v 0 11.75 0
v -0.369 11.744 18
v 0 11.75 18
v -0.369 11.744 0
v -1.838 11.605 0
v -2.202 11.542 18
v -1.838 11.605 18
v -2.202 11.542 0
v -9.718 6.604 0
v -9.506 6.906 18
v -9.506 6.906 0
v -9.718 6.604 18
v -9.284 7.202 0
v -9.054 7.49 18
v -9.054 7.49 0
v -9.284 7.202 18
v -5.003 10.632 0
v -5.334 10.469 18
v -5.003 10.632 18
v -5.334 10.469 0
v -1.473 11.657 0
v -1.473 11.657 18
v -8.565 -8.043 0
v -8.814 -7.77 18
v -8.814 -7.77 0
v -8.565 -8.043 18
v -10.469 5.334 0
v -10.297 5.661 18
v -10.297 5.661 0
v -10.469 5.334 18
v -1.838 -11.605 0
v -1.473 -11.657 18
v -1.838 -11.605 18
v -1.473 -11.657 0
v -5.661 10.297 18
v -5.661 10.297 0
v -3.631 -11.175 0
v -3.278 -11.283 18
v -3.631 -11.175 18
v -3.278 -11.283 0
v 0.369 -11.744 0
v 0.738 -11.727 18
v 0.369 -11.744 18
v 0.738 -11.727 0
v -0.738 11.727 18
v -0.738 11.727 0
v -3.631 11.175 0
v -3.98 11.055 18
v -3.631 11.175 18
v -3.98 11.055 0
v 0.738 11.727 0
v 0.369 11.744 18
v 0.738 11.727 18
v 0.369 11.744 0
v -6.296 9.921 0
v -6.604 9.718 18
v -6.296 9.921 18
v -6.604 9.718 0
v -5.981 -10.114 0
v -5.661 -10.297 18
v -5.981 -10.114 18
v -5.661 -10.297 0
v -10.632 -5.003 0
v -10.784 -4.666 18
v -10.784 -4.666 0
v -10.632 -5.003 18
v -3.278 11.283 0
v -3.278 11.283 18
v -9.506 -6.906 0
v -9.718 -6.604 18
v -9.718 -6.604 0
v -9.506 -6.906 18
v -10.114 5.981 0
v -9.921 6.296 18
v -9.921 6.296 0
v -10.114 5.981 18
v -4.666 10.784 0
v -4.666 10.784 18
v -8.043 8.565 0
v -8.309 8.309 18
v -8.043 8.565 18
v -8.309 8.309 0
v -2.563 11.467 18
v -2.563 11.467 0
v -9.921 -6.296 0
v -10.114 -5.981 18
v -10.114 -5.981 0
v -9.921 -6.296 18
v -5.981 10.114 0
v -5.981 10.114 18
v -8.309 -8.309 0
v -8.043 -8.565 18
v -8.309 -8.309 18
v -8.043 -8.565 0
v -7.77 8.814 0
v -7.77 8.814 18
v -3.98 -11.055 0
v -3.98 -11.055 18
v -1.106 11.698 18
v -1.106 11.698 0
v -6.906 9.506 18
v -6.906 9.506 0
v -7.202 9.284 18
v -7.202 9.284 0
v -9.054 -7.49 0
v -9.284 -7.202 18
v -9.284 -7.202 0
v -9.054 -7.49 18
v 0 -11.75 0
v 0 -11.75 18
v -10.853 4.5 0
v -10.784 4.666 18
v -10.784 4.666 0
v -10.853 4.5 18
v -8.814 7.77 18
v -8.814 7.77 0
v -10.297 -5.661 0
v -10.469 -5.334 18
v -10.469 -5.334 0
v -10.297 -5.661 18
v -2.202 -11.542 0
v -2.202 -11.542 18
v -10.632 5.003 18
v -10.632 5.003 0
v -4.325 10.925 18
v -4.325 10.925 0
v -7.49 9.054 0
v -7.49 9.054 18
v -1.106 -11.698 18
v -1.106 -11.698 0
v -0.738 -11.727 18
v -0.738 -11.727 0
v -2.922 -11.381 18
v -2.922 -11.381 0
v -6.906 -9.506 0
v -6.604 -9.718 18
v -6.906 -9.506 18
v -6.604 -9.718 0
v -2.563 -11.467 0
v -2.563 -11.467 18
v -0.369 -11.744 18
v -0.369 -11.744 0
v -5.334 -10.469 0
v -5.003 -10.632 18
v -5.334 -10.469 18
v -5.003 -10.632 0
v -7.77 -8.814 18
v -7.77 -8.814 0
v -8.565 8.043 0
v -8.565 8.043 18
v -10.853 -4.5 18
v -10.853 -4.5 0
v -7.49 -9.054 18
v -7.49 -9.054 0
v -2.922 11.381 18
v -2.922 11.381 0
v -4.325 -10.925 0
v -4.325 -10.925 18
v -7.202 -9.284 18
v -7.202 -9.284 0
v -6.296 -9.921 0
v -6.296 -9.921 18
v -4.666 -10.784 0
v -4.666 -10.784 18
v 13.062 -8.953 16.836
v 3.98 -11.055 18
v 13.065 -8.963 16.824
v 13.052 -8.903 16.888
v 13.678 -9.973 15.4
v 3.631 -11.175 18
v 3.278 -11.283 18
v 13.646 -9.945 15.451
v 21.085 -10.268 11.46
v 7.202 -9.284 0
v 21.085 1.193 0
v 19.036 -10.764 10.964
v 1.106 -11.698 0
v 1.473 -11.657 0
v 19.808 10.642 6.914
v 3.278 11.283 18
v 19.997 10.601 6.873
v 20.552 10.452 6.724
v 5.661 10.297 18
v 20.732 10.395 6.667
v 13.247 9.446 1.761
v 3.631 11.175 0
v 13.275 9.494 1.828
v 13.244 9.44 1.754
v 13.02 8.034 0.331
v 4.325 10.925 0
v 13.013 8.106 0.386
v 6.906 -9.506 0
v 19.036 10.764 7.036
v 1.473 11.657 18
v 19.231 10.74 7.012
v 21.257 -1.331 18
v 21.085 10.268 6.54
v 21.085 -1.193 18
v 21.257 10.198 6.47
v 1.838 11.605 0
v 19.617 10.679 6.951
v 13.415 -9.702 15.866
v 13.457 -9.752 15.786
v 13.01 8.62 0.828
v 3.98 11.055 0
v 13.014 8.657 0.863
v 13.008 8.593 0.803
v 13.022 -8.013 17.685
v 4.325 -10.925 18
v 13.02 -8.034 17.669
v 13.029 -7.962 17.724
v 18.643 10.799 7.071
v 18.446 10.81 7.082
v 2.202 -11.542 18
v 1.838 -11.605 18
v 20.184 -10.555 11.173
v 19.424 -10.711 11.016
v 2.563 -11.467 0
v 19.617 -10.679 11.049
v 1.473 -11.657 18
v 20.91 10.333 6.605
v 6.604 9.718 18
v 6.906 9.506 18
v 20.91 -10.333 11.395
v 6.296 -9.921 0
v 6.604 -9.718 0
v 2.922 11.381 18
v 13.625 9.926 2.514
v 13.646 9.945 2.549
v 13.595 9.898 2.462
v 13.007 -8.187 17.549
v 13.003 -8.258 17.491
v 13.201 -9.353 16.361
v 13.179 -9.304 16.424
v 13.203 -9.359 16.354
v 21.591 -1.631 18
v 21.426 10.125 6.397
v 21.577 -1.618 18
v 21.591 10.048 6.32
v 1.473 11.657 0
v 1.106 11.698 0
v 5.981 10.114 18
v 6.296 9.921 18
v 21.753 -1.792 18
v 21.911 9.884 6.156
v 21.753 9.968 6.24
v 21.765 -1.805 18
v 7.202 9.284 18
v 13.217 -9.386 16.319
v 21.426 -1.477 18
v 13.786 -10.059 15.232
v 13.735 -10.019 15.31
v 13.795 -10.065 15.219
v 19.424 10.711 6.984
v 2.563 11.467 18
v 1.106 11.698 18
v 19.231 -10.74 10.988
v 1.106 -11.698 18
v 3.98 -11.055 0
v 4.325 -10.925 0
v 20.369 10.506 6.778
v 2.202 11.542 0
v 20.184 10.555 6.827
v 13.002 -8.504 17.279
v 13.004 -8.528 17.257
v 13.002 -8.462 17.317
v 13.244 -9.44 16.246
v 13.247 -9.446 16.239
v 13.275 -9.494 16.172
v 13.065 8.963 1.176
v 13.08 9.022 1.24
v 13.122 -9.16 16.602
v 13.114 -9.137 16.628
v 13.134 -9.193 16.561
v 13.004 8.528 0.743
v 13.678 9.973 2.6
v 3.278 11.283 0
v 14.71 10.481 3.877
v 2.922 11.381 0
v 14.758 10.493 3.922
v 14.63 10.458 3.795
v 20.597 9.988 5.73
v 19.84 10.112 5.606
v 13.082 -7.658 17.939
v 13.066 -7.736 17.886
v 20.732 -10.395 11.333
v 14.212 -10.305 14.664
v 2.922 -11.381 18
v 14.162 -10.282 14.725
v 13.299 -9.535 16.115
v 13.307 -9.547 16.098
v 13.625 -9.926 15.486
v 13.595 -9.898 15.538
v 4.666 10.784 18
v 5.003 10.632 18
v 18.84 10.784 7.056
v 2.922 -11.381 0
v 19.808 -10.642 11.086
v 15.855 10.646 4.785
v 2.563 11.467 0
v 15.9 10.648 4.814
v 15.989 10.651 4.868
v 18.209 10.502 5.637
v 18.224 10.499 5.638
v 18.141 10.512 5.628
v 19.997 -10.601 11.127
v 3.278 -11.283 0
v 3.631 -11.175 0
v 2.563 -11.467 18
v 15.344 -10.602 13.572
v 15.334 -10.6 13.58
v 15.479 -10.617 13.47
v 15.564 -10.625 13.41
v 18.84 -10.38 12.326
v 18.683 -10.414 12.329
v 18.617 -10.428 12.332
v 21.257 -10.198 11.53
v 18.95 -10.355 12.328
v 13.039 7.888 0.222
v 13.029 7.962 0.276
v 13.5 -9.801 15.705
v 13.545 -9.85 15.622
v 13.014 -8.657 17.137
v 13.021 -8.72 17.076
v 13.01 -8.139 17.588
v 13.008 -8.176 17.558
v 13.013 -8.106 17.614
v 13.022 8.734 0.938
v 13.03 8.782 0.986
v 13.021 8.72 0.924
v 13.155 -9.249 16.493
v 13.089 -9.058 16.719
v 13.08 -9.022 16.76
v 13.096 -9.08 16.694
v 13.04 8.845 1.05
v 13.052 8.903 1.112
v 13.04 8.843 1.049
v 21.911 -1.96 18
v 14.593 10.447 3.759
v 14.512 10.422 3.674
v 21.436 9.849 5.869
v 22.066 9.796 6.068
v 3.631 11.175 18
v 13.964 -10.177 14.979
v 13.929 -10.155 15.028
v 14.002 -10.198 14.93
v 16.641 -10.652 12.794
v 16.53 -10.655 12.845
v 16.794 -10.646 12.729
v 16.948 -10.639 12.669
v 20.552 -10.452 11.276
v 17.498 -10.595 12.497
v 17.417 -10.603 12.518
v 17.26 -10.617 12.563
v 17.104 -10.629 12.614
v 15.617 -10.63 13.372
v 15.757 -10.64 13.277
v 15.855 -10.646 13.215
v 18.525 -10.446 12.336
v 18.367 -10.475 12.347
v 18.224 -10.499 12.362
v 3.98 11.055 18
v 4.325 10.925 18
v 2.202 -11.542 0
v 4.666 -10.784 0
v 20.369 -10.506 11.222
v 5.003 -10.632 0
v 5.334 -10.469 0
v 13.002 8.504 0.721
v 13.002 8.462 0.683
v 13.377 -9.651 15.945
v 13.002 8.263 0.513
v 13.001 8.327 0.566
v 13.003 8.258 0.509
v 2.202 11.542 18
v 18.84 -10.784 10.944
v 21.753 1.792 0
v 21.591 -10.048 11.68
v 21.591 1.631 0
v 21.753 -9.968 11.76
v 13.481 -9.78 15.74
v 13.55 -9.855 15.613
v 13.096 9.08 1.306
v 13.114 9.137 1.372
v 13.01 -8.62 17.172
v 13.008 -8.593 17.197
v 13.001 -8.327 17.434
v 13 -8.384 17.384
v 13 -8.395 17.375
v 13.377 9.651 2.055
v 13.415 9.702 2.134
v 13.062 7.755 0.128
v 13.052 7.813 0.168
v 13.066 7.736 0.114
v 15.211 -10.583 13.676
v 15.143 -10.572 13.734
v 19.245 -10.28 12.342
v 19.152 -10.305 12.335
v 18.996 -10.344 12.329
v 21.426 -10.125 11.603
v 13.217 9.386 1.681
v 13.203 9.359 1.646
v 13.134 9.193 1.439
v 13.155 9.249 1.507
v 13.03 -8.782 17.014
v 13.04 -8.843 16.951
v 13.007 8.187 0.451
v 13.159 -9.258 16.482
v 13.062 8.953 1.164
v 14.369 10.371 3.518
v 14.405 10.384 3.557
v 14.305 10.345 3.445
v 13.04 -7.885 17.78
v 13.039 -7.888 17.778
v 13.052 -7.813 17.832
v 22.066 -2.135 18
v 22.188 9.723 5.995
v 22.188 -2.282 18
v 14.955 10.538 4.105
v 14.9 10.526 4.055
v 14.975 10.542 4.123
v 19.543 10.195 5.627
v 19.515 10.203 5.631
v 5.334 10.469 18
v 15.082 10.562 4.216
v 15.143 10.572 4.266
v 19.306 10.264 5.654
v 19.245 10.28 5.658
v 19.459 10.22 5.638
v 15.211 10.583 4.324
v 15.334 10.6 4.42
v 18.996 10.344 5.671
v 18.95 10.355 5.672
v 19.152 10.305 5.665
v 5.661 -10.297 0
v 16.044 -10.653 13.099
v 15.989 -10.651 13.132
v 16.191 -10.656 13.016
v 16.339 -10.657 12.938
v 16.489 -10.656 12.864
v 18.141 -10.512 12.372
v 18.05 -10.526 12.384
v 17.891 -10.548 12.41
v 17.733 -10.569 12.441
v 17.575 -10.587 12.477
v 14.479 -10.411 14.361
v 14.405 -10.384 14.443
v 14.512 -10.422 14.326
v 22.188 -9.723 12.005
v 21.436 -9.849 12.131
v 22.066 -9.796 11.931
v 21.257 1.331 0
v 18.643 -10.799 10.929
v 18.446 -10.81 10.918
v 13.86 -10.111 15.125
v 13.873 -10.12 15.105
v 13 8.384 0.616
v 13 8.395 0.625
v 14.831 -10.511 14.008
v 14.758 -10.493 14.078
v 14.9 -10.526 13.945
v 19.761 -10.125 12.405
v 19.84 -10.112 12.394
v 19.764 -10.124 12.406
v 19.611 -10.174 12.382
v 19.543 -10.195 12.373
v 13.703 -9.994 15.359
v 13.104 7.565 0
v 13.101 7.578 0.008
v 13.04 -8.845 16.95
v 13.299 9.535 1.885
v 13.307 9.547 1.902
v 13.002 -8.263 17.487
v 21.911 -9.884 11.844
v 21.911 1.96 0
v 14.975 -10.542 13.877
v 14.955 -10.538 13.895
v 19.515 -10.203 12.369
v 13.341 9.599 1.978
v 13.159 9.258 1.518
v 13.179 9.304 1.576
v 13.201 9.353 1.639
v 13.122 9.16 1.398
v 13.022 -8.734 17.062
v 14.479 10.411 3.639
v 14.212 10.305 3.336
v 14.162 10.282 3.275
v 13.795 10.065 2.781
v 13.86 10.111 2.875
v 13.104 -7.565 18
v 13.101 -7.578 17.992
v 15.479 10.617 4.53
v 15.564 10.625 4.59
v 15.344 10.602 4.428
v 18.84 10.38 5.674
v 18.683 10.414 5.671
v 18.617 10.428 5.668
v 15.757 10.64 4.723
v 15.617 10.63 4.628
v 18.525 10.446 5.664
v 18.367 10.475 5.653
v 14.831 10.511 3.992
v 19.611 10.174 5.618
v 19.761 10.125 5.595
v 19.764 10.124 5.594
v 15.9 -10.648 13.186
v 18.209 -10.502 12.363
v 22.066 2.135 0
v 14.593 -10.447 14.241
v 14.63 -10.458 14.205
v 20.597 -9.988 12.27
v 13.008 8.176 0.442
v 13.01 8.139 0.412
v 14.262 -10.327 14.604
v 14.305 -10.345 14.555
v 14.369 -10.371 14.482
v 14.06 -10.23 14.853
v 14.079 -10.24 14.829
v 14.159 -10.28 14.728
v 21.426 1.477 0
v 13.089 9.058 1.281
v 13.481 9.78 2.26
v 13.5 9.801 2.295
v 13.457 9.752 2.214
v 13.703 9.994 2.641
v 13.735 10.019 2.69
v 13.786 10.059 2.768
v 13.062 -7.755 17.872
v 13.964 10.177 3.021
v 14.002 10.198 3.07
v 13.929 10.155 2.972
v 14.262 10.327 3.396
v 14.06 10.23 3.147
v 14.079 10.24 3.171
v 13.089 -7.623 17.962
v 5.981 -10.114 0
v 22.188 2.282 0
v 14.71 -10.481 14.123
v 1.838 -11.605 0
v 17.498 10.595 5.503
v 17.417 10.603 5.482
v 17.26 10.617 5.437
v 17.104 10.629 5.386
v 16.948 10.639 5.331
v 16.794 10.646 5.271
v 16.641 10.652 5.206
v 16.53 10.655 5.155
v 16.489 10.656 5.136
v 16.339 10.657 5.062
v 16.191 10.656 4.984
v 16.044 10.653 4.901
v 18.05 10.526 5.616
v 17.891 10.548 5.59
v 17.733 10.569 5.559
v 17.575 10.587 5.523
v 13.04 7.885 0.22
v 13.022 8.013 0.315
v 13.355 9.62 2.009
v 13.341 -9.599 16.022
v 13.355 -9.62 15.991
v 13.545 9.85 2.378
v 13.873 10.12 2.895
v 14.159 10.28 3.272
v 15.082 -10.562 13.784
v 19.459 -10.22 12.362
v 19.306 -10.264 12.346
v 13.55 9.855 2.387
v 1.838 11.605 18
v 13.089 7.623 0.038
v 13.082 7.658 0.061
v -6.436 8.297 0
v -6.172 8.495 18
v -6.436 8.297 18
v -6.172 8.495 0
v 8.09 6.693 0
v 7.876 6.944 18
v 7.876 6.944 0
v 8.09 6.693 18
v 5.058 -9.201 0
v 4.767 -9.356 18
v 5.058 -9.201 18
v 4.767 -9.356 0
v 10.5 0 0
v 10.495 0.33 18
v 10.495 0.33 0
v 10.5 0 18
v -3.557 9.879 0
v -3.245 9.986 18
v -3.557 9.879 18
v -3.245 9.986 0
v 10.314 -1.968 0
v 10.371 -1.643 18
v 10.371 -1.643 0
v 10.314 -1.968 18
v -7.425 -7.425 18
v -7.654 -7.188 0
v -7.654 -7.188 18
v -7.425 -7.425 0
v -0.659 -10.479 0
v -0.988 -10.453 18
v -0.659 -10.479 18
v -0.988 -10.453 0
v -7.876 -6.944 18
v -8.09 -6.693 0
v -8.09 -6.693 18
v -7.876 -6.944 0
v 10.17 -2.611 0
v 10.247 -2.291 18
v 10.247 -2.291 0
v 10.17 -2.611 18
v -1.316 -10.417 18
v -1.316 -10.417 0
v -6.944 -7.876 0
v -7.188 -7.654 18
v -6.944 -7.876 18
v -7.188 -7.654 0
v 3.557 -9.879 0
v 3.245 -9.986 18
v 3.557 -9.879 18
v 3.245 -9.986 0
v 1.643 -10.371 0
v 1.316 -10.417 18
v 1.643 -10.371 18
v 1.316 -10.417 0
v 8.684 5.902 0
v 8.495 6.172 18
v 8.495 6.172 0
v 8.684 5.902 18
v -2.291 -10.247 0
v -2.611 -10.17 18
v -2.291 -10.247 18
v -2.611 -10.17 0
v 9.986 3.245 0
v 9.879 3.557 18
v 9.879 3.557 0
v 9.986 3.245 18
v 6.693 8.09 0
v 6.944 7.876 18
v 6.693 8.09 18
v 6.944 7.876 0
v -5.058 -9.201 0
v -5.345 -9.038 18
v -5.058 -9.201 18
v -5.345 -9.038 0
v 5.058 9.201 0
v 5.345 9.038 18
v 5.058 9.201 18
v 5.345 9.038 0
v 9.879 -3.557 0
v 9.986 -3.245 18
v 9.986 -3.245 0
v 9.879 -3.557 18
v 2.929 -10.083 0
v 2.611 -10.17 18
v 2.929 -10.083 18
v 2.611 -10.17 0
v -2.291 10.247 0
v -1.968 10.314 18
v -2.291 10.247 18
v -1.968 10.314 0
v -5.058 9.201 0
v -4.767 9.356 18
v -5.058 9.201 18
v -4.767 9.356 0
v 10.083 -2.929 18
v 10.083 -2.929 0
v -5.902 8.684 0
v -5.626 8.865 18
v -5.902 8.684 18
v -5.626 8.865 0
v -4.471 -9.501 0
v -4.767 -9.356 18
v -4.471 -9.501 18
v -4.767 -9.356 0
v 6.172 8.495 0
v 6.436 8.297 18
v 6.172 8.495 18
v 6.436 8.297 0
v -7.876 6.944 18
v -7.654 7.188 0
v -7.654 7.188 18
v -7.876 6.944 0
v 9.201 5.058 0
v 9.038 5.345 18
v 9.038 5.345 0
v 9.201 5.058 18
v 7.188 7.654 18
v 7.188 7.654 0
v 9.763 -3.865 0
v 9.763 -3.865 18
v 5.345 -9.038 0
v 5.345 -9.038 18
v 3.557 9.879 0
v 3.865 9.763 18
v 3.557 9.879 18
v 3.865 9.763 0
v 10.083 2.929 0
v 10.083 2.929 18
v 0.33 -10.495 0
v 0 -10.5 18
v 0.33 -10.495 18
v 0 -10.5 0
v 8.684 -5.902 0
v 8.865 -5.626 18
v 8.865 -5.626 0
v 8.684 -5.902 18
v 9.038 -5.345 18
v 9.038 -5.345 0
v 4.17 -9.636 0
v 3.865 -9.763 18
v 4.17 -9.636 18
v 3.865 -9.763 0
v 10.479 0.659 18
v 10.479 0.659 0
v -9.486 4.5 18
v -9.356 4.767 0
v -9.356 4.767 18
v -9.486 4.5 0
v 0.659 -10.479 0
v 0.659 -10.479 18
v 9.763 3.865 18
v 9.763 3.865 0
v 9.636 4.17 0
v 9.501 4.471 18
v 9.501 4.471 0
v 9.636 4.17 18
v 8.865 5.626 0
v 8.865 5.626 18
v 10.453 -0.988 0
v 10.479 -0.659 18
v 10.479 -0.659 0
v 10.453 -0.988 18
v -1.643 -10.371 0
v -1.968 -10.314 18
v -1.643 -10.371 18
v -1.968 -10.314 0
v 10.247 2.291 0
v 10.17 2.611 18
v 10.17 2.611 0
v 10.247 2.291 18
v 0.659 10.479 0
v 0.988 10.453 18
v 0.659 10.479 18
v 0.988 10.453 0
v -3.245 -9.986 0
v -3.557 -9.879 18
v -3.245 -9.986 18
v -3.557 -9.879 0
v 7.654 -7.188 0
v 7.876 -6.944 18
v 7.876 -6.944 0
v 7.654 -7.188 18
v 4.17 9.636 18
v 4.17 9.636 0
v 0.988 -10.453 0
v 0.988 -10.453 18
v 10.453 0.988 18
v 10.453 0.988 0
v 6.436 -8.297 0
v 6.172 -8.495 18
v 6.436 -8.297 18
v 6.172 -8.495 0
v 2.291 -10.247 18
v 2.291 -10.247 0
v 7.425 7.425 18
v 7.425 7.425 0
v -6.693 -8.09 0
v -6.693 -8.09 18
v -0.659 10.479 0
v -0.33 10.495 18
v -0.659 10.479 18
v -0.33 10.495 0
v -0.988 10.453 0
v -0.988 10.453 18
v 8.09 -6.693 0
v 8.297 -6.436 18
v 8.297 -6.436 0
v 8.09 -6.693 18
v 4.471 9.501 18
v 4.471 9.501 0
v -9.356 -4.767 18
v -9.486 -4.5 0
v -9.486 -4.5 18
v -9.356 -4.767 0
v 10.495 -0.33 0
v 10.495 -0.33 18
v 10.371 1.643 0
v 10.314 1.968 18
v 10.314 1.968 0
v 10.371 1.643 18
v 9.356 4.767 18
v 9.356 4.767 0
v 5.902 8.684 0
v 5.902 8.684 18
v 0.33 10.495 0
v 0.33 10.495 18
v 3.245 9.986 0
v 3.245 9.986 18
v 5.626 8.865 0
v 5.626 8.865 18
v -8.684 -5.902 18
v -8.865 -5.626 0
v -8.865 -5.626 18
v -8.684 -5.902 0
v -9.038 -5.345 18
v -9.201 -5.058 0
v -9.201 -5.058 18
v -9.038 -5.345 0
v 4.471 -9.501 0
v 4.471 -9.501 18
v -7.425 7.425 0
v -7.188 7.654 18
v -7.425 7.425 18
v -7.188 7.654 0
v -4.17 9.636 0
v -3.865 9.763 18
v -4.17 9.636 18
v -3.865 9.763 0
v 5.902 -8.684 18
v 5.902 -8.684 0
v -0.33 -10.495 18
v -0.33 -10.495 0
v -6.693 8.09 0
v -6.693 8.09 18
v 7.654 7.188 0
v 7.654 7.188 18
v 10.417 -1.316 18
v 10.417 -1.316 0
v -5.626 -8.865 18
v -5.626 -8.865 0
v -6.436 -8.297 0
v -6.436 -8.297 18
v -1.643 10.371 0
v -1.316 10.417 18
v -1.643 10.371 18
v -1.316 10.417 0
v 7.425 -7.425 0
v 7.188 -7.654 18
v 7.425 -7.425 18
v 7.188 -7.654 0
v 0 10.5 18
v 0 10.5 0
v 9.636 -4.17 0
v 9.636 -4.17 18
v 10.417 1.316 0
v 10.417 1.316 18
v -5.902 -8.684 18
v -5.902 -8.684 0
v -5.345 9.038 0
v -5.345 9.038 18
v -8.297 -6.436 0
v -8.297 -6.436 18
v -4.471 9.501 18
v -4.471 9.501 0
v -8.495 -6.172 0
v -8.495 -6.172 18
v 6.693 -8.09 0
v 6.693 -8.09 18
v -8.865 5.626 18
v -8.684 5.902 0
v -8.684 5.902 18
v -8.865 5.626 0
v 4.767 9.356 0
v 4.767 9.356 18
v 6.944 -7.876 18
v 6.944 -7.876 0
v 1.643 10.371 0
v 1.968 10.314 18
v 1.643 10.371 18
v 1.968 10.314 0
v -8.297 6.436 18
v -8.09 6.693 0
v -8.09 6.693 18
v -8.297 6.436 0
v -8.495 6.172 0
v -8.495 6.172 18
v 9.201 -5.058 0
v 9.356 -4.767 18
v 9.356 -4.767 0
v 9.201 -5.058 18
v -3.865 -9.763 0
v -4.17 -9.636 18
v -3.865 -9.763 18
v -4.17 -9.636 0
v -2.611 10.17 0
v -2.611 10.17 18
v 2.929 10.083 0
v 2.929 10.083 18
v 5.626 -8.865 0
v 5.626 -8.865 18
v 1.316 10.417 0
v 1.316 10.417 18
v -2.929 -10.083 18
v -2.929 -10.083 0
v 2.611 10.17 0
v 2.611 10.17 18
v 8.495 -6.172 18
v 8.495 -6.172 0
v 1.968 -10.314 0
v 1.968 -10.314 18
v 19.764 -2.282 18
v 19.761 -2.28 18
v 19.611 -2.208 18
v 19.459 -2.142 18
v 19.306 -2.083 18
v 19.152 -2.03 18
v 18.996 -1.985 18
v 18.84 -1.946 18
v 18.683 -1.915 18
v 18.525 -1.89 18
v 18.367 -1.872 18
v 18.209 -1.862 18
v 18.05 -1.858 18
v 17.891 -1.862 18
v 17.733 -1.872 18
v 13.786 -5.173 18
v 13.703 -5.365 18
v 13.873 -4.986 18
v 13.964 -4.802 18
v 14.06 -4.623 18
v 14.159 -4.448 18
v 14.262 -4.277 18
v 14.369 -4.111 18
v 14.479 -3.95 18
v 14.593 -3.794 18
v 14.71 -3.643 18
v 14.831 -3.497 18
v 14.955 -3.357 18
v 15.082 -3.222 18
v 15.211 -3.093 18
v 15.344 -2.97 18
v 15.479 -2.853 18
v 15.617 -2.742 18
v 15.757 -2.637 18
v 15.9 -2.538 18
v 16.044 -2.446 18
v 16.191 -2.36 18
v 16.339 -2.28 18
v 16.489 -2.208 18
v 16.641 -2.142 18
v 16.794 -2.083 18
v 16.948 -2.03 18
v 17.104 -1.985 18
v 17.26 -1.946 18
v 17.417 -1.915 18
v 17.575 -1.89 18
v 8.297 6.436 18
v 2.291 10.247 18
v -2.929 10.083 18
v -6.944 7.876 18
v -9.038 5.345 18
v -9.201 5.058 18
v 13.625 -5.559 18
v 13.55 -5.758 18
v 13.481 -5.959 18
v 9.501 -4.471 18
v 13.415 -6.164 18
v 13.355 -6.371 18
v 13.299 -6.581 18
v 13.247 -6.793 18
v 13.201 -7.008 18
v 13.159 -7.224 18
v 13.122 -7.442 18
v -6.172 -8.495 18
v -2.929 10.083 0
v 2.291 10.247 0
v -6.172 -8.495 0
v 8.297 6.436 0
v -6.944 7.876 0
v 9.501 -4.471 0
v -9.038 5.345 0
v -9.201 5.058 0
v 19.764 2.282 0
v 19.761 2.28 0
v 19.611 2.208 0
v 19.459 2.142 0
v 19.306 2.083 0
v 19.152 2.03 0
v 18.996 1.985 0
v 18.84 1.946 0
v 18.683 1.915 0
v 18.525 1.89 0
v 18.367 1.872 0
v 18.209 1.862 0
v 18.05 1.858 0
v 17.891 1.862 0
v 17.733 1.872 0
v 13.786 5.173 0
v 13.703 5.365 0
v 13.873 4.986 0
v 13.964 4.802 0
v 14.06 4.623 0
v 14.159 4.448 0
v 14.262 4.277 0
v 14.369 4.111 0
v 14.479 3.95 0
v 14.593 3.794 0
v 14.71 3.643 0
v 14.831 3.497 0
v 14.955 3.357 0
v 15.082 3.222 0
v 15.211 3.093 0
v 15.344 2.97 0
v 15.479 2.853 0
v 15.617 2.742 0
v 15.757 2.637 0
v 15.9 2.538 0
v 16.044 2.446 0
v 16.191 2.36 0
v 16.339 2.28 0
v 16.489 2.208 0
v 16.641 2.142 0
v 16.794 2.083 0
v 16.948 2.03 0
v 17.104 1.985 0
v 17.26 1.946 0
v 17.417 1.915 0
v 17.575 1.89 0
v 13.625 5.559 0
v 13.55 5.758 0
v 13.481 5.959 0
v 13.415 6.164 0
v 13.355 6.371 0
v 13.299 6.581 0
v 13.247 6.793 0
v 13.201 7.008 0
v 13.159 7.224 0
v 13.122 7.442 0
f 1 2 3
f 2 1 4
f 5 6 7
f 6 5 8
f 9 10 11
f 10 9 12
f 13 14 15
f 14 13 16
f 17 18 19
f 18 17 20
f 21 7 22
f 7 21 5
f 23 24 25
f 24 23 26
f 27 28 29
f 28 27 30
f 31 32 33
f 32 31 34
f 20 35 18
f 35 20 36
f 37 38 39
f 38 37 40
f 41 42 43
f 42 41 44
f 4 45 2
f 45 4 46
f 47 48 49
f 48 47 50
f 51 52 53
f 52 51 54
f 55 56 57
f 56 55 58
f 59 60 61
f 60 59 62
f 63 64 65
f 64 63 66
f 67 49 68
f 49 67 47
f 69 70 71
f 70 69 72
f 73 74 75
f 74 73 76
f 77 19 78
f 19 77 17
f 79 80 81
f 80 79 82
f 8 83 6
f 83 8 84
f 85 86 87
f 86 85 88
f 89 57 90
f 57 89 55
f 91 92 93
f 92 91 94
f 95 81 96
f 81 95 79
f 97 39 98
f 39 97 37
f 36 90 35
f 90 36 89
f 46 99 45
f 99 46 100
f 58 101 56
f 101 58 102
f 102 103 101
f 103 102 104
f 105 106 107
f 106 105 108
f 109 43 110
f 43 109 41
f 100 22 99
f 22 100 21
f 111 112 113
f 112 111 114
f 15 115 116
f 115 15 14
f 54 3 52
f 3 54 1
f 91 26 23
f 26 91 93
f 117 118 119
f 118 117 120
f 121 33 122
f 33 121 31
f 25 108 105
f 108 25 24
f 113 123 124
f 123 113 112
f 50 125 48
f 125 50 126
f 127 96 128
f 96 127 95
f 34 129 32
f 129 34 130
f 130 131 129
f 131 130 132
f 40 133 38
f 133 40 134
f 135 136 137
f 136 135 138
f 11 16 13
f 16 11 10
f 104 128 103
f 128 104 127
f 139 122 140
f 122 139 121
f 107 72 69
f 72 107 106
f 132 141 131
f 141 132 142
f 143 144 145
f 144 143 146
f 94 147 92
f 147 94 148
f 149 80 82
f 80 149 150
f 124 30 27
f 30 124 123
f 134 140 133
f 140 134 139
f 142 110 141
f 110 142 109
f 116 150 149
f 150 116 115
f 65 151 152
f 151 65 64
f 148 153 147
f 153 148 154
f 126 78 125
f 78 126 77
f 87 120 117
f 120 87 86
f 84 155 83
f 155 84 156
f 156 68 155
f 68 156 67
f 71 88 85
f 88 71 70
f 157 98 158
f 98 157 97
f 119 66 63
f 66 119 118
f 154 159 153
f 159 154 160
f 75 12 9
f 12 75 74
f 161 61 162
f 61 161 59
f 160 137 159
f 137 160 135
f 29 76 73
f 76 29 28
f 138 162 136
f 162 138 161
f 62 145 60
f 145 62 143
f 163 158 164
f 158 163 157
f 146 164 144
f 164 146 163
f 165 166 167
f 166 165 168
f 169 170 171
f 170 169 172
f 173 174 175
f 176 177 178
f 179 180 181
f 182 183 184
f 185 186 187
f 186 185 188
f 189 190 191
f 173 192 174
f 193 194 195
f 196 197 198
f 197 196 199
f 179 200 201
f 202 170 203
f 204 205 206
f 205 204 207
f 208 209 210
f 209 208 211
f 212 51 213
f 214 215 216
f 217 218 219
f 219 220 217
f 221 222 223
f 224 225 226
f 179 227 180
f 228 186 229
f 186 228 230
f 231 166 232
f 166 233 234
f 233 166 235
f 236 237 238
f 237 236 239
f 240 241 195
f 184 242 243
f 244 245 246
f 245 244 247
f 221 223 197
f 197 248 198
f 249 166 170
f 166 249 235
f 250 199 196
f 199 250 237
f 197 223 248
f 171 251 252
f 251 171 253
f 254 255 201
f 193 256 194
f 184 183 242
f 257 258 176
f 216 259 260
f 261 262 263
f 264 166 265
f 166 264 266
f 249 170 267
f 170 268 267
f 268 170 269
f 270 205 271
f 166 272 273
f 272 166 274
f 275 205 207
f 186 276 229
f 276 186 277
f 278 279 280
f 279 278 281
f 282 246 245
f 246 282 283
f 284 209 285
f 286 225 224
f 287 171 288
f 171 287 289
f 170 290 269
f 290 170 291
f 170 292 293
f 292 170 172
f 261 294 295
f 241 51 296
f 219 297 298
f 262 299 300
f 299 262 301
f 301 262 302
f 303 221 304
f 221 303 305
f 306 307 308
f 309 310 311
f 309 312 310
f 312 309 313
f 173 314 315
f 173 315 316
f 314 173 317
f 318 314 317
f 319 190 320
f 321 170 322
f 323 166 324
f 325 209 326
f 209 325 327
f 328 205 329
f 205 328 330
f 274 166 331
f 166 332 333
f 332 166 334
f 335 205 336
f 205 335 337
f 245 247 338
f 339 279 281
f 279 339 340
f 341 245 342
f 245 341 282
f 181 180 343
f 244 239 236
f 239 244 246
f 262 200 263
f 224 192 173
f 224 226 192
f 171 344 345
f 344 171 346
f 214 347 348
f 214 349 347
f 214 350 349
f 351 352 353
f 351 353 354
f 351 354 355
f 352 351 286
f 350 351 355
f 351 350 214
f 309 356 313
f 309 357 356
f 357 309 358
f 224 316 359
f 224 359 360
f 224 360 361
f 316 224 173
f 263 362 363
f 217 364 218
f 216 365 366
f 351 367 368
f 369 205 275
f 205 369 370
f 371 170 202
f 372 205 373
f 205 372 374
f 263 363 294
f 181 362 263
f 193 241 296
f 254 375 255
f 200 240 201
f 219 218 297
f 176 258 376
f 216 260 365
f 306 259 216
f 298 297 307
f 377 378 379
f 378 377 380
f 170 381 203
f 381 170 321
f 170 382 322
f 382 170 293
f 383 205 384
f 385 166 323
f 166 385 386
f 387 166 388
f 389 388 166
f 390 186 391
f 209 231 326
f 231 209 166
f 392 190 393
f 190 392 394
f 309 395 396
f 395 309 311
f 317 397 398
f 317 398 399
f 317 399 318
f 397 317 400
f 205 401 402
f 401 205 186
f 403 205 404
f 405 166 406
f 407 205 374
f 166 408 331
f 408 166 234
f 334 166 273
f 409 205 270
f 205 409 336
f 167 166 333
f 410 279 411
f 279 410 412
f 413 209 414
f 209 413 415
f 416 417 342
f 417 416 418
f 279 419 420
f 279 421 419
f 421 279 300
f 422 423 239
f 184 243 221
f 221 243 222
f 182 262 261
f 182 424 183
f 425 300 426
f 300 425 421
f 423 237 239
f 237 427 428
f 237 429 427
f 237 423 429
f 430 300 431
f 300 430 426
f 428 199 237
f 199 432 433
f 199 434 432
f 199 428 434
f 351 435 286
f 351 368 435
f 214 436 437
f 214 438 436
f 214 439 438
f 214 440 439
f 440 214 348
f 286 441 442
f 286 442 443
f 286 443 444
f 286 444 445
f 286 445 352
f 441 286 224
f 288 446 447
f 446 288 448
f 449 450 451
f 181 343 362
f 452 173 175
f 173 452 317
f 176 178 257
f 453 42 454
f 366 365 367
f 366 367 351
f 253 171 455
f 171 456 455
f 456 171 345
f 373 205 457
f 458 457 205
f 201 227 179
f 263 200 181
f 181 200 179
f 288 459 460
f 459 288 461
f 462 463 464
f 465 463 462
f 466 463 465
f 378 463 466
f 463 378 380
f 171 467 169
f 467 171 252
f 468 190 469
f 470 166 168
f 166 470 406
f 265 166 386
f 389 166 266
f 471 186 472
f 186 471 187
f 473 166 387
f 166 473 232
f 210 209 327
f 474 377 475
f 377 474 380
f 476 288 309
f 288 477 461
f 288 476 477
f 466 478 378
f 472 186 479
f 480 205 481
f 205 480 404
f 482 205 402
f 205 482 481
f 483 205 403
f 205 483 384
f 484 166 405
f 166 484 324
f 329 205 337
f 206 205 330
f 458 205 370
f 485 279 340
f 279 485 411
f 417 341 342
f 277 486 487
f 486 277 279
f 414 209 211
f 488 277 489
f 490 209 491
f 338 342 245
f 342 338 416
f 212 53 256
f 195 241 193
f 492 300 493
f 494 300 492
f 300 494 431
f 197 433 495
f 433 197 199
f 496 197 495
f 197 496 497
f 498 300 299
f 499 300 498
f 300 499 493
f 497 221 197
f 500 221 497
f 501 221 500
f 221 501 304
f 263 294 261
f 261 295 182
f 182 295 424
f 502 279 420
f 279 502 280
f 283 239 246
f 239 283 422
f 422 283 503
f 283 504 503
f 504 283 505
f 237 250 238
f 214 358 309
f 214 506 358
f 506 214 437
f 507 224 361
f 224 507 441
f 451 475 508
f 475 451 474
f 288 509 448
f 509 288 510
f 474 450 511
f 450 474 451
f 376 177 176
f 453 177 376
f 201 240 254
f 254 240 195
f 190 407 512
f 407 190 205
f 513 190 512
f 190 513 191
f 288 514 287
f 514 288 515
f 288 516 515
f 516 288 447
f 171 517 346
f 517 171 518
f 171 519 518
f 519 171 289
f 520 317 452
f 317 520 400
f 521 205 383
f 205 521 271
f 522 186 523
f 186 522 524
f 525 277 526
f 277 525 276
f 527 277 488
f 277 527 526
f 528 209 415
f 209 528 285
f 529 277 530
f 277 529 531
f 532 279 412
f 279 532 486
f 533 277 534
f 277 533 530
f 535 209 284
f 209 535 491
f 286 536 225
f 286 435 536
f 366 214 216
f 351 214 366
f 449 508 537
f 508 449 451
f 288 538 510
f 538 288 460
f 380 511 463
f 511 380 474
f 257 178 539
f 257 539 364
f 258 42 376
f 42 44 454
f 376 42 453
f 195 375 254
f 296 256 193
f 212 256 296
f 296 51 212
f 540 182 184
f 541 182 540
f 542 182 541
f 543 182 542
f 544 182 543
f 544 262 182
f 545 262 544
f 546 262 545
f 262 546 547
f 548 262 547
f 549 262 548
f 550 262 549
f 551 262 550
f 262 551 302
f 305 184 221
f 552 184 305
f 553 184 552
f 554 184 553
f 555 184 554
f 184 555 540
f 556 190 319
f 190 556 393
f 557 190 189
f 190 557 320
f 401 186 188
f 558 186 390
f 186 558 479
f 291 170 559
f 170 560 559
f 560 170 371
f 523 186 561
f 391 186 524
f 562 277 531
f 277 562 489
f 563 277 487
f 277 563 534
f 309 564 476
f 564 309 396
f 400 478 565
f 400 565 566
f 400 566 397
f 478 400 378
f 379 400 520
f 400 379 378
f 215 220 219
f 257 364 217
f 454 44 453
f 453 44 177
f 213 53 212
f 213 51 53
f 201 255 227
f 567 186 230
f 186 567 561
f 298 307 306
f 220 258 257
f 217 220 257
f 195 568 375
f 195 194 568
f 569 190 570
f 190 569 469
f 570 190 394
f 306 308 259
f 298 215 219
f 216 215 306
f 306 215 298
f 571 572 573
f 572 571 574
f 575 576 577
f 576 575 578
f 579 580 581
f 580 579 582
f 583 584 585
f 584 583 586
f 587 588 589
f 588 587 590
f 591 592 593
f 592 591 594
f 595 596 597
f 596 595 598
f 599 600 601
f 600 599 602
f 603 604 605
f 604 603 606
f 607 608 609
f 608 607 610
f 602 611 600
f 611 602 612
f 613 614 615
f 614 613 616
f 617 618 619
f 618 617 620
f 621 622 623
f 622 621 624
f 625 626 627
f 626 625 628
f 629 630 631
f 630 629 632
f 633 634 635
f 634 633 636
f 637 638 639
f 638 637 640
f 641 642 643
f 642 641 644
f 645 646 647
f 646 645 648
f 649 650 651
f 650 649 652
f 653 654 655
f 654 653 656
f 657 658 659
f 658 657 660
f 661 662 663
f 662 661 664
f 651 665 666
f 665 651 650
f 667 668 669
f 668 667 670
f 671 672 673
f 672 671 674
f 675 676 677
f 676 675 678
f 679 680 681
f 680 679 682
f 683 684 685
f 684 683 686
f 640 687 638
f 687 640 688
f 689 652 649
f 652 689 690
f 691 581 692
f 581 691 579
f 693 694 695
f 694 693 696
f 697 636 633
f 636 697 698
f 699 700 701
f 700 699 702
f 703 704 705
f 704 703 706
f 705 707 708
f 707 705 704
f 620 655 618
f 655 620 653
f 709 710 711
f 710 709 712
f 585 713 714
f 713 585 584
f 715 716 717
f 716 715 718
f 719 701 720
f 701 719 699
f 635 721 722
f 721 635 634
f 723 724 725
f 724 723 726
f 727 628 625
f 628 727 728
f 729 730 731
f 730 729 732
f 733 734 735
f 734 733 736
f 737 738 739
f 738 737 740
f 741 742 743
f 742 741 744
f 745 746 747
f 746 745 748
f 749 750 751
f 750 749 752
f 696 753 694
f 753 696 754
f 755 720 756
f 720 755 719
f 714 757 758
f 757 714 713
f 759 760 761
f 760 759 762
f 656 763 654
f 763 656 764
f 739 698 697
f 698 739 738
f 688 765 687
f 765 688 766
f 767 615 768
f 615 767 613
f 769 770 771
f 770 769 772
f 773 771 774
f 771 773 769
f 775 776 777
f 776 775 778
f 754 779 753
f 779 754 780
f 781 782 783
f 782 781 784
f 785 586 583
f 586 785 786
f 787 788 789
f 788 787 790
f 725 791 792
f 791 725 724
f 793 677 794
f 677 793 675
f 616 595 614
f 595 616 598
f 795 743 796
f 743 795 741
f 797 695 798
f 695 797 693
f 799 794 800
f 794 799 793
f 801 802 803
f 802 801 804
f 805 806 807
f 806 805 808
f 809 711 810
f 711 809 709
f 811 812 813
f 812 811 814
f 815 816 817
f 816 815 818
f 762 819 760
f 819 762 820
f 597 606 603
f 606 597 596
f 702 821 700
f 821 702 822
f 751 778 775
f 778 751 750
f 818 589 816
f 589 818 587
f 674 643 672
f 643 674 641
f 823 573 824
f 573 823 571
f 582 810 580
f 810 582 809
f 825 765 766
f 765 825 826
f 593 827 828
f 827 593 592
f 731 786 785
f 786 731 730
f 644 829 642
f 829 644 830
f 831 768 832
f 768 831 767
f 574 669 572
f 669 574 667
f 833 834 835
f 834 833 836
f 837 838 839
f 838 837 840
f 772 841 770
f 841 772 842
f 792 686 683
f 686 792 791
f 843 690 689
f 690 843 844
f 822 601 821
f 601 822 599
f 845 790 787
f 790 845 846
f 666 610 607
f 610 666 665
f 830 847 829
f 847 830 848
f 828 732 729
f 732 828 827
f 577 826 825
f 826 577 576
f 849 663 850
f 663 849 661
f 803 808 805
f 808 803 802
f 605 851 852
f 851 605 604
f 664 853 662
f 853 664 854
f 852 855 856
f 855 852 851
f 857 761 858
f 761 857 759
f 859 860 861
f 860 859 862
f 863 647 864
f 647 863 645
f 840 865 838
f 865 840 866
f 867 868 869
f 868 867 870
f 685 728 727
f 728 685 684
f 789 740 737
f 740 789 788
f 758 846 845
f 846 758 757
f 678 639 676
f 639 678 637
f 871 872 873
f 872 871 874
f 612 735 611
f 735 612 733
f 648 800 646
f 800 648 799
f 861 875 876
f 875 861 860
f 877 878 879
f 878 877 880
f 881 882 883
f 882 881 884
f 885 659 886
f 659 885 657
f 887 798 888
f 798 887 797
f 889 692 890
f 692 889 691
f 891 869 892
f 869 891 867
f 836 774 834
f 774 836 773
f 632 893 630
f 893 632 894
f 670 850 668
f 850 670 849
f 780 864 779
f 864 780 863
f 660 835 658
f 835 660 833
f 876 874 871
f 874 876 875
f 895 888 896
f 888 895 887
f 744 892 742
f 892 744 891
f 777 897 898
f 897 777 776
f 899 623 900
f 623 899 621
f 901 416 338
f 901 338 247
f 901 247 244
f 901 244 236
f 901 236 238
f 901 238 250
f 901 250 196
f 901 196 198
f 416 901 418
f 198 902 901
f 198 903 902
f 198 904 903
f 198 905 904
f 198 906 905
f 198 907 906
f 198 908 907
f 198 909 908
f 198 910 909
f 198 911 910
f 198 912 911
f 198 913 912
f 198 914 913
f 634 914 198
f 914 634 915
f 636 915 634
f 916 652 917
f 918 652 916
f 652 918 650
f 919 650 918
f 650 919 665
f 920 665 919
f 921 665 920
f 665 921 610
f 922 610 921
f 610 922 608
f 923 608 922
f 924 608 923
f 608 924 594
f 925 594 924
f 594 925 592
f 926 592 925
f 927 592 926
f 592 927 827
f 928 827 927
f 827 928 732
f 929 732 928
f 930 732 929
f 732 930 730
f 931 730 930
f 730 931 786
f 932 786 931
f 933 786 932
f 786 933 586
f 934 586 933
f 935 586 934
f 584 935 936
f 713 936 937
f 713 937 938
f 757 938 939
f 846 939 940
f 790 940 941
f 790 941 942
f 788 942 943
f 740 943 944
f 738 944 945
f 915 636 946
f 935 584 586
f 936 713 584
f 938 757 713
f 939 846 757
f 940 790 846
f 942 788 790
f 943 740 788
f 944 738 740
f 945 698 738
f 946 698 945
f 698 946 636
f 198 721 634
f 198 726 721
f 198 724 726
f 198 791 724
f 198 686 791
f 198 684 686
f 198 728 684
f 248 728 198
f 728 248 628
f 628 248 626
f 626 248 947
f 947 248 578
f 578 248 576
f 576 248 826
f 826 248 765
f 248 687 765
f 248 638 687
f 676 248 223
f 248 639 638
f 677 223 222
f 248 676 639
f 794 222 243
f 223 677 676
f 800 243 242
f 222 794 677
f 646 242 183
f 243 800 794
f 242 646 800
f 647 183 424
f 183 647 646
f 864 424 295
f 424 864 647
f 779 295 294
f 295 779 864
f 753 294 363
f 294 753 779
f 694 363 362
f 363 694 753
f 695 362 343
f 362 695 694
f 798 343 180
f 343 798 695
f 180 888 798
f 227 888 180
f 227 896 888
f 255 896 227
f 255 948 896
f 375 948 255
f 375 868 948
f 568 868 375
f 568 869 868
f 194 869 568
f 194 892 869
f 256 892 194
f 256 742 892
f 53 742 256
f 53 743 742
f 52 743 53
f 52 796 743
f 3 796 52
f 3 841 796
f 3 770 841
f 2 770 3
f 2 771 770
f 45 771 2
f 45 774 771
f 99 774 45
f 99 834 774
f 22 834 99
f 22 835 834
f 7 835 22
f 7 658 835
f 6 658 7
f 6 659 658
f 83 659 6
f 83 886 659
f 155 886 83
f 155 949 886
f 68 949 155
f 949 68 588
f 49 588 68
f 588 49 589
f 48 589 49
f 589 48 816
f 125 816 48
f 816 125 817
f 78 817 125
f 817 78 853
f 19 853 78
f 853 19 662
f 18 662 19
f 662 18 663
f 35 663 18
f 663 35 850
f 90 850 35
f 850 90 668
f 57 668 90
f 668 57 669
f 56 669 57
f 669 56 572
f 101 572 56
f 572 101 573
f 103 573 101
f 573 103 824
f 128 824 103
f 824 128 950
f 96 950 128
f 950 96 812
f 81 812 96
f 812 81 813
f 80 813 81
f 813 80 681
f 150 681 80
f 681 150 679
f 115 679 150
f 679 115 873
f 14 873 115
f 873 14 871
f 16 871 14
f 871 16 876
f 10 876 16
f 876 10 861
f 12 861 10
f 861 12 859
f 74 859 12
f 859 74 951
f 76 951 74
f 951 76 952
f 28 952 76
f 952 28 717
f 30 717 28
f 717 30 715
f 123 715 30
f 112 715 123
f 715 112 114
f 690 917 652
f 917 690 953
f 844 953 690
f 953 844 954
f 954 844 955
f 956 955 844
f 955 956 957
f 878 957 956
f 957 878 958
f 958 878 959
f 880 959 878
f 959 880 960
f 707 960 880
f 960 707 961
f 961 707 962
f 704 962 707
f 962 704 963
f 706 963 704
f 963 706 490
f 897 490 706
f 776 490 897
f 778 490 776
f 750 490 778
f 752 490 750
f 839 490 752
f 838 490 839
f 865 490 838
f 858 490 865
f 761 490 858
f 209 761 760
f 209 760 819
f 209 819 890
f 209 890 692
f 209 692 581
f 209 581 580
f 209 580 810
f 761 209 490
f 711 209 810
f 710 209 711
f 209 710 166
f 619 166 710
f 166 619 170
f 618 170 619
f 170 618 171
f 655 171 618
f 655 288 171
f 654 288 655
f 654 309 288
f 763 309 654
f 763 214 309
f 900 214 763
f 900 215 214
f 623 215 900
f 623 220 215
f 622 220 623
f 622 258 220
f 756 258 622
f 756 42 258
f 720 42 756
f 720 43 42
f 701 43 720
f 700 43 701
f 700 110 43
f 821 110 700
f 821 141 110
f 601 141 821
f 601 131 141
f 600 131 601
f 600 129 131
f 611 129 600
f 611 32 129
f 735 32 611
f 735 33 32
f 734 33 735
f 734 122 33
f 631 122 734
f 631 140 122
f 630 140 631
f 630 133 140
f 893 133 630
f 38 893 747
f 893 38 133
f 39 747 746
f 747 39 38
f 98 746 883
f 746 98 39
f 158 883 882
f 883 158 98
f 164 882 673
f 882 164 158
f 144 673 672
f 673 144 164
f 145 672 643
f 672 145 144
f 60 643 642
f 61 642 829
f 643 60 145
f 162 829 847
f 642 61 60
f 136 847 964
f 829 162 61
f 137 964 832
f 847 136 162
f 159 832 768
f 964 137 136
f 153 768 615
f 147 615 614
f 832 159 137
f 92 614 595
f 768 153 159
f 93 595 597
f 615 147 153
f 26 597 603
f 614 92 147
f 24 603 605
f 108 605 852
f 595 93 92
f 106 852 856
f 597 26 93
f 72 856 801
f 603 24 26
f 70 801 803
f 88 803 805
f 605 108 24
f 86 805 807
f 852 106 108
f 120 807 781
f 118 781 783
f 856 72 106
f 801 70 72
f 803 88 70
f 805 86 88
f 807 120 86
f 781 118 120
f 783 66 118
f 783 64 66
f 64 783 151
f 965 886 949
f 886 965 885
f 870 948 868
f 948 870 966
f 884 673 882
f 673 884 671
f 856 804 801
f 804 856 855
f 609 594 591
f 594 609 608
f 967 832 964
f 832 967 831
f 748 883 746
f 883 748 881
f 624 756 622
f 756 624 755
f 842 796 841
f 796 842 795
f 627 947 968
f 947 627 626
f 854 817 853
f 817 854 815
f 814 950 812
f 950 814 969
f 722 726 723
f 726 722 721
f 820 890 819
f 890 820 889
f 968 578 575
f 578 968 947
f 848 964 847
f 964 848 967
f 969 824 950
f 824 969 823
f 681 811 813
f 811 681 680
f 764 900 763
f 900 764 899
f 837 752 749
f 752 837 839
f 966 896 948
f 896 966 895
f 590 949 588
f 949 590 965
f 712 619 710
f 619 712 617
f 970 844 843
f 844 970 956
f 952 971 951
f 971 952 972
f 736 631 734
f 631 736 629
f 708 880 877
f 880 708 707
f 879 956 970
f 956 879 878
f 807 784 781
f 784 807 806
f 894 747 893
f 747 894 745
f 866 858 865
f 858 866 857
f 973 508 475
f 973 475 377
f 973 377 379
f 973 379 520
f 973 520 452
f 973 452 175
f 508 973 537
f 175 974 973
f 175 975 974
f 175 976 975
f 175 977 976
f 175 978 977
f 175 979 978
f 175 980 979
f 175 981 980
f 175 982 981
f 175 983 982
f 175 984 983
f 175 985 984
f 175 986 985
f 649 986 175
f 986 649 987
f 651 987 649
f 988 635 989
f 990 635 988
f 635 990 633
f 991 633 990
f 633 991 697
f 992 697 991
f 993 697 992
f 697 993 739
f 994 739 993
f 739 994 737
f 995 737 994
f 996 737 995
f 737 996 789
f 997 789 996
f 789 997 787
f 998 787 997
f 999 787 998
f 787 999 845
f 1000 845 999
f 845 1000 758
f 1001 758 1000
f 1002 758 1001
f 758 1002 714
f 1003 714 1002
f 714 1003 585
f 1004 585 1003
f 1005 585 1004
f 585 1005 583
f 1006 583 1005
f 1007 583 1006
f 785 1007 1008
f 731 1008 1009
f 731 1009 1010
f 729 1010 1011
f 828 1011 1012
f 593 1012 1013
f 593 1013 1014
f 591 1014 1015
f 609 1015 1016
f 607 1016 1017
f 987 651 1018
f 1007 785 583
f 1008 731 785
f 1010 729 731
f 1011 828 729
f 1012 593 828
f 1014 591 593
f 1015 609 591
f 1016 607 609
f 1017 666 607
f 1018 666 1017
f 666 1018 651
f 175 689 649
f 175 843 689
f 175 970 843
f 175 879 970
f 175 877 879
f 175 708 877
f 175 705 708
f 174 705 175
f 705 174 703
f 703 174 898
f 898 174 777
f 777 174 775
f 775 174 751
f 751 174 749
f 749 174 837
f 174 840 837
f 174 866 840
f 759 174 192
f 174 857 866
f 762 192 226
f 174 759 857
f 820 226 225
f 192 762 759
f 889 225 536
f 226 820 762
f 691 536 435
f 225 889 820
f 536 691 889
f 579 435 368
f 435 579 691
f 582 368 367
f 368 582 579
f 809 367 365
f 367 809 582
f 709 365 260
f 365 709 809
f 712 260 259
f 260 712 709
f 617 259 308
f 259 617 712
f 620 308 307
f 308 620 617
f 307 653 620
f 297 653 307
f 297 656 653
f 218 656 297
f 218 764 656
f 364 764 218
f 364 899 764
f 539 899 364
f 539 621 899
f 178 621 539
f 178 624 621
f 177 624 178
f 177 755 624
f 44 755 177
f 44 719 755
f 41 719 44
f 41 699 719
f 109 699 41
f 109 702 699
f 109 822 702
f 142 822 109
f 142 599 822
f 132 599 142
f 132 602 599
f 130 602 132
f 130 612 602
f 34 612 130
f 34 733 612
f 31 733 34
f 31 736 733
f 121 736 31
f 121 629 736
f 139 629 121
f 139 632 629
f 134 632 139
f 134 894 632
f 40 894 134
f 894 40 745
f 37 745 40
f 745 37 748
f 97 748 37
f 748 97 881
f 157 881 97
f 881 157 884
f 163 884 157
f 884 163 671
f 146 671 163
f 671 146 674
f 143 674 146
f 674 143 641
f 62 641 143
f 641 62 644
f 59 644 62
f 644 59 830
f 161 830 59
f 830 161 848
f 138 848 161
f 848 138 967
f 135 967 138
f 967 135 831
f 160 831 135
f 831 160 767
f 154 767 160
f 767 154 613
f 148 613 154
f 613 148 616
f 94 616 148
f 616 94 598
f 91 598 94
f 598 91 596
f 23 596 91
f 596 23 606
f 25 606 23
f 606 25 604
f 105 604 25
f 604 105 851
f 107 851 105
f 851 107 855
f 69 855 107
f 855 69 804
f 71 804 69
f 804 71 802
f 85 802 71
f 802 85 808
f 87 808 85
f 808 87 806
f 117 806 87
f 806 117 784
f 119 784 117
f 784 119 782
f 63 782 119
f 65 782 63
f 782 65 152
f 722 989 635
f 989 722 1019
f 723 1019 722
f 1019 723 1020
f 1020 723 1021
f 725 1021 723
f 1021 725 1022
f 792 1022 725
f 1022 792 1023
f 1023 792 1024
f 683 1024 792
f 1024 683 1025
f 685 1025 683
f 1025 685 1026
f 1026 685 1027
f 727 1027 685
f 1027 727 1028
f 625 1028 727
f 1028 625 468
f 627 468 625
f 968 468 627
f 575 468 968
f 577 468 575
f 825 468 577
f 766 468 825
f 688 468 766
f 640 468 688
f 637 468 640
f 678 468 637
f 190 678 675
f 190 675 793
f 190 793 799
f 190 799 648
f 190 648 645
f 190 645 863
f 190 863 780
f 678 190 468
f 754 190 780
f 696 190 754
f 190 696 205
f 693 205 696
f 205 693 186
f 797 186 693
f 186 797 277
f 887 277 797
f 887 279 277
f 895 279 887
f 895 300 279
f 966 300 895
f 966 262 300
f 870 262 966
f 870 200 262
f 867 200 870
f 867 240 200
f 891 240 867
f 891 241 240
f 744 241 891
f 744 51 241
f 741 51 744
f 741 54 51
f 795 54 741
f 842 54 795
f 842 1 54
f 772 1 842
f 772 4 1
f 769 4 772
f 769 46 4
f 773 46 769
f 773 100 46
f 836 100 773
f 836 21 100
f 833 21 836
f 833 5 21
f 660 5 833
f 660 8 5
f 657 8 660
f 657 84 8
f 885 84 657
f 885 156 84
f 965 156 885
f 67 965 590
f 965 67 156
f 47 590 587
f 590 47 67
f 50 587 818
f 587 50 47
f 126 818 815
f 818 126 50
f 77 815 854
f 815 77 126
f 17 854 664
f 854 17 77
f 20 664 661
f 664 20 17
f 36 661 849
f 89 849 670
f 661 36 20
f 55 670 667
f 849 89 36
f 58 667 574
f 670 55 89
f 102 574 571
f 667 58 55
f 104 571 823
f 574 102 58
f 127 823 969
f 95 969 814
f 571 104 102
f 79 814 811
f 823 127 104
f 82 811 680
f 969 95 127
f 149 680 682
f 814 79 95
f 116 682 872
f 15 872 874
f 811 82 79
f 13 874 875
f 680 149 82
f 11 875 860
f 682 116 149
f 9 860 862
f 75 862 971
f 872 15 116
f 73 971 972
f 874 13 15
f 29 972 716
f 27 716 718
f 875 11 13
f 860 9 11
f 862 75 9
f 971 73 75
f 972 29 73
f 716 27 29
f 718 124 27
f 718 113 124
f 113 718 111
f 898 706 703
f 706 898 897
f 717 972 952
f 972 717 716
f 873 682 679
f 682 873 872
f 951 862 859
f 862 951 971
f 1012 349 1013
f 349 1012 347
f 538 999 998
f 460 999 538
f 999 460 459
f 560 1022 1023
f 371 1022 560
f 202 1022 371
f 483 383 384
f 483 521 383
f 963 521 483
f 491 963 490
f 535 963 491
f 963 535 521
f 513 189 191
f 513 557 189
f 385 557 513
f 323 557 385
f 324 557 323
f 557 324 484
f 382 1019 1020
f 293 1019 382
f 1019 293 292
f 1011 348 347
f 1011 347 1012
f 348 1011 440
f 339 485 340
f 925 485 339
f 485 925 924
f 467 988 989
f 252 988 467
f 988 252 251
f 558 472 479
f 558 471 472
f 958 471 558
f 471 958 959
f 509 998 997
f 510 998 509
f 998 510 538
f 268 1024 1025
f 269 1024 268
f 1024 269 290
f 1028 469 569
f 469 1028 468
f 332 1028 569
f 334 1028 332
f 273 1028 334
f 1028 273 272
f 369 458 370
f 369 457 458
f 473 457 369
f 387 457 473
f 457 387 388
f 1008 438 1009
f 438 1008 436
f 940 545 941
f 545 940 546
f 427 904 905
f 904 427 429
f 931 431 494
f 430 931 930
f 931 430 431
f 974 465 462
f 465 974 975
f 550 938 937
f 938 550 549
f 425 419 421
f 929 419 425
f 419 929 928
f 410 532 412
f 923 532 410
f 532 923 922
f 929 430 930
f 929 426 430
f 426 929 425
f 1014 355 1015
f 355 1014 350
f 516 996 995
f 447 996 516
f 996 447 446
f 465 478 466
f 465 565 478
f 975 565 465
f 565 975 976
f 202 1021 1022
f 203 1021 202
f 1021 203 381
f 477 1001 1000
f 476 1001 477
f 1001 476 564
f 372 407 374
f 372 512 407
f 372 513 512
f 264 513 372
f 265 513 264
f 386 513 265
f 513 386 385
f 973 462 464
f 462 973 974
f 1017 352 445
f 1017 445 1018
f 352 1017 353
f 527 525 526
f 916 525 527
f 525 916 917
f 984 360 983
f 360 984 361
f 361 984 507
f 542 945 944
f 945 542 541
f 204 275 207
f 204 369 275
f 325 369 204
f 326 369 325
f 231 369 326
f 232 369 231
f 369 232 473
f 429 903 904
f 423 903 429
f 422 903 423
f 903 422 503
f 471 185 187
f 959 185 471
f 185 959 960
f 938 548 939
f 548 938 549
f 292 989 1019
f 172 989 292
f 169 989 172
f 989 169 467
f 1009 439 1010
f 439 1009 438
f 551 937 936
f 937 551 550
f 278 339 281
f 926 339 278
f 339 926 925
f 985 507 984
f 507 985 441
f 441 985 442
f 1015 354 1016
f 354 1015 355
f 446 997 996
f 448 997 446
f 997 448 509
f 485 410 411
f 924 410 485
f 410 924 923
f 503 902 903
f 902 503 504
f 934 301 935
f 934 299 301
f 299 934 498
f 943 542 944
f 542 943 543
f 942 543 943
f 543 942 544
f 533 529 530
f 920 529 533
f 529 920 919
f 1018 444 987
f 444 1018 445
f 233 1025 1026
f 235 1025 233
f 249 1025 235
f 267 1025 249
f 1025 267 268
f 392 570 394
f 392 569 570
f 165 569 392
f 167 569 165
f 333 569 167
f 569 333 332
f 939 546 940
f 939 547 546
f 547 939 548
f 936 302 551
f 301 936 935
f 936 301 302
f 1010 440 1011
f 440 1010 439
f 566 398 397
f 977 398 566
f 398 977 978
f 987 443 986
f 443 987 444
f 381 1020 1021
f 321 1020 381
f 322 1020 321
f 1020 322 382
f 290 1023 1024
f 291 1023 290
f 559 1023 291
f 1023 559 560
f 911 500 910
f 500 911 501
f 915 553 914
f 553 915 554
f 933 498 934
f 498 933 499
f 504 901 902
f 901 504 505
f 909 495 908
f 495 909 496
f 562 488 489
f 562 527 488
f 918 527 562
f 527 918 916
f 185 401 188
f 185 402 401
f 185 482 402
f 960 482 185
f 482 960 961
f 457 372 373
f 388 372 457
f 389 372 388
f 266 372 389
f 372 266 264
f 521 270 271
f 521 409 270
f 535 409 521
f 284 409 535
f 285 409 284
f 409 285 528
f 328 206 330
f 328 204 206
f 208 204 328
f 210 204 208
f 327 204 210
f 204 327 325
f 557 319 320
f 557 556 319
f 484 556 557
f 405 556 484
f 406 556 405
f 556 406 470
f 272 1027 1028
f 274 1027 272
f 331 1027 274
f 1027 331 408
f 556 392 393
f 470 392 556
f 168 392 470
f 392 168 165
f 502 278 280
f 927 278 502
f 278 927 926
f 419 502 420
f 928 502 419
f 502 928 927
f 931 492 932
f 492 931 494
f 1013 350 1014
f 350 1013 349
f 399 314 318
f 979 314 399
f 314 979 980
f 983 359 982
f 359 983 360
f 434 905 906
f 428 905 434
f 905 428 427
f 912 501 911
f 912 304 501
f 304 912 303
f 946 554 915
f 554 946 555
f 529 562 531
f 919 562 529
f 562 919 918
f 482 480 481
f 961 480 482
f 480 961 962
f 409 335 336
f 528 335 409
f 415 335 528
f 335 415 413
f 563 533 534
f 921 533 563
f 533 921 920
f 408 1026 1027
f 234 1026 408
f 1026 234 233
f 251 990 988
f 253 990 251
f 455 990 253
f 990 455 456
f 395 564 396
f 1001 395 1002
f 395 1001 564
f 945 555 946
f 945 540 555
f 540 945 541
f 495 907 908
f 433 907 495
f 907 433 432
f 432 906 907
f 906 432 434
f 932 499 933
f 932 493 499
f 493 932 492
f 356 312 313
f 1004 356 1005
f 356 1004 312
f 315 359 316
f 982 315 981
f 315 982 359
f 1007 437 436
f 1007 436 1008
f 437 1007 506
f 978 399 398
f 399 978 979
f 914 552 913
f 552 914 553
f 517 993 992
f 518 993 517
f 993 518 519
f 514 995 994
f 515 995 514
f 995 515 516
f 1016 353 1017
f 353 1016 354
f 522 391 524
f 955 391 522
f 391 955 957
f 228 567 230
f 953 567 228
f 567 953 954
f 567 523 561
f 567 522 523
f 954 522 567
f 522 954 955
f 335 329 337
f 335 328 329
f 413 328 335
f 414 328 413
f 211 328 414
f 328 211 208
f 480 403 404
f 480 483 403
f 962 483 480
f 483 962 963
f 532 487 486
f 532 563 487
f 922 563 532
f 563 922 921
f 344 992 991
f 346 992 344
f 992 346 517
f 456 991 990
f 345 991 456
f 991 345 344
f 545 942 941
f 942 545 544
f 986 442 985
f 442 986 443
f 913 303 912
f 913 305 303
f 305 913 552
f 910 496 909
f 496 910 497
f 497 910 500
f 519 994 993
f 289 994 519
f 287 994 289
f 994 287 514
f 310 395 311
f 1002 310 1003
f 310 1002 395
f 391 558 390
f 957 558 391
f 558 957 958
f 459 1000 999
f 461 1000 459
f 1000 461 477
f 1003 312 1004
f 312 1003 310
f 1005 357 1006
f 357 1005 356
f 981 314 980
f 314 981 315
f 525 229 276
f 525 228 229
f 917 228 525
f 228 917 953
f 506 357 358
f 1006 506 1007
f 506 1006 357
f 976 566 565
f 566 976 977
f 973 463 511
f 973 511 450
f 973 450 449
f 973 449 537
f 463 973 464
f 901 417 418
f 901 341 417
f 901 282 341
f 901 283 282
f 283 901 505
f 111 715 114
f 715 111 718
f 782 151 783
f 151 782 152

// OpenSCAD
/////////////////////////////////////////////////////////////////
//Remix by W. Englert 12/02/2018/////////////////////////////////
//Finger_Pen_Holder_V2.0_OpenSCAD////////////////////////////////
//Maker's Making Change /////////////////////////////////////////
//http://www.makersmakingchange.com//////////////////////////////
//Remix of Finger Pen Holder (Vertical) by makersmakingchange////
//Published on February 28, 2018/////////////////////////////////
//www.thingiverse.com/thing:2802074//////////////////////////////


/*[variables]*/

//Length of the Ring
Ring_L = 18.0; // [10:0.5:40]

//Ring hole size (mm)
Ring_HD = 21.0; // [10:0.5:40]

//Ring Edge Cutout (mm)
Ring_C =9.0; // [0:0.5:40]

//Thickness of the Ring (mm)
Ring_T = 2.5; // [2:0.1:4]

//Length of the pen holder (mm)
Pen_L = 18; // [10:0.5:40]

//Pen hole size (mm)
Pen_HD = 10.1; // [1:0.1:40]

//Pen Edge Cutout
Pen_C = 9.5; // [0:0.1:40]

//Thickness of Pen holder
Pen_T = 2.5; // [2:0.1:4]

//Angle of Pen holder (degrees)
Pen_A =45; // [0:1:359]

//Additional distance from ring to pen
Distance = 0;// [0:0.5:40]

/*[Hidden]*/
//Total width for top and bottom trimming
Total_W = Ring_HD+(Ring_T*2)+(Pen_HD*2)+(Pen_T*2)+(Distance*2);

//facet Number
$fn=200;


//////////////////////////////////////////////////////////
//////////////////////////////////////////////////////////
//Renders
difference(){
Outer_Structure();
holes();
}


//////////////////////////////////////////////////////////
//////////////////////////////////////////////////////////

//modules

module Outer_Structure (){
//Ring Outer
    cylinder(d1=Ring_T+Ring_HD,d2=Ring_T+Ring_HD, h=Ring_L);

//Ring and Pen outer structure    
hull(){
//hull attachment point on the ring
    cylinder(d1=Ring_T+Ring_HD,d2=Ring_T+Ring_HD, h=Pen_L);

// Pen holder Outer    
    translate([(Ring_HD*0.5)+(Pen_HD*0.5)+(Ring_T*0.5)+(Pen_T*0.5)+Distance,0,(Pen_L*.5)])rotate([Pen_A,0,0]){
    cylinder(d1=Pen_HD + Pen_T,d2=Pen_HD + Pen_T,h=Pen_L, center=true);}
}
}
module holes(){
// Ring Hole
    cylinder(d1=Ring_HD, d2=Ring_HD, h=Ring_L);
    
// Pen Hole    
    translate([(Ring_HD*0.5)+(Pen_HD*0.5)+(Ring_T*0.5)+(Pen_T*0.5)+Distance,0,(Pen_L*.5)])rotate([Pen_A,0,0]){
    cylinder(d1=Pen_HD,d2=Pen_HD,h=Pen_L*2, center=true);}

// Cutout for Pen Hole   
    translate([(Ring_HD*0.5)+(Pen_HD)+(Ring_T*0.5)+(Pen_T*0.5)+Distance,0,Pen_L*.5])rotate([Pen_A,0,0]){
    cube([Pen_HD,Pen_C,Pen_L*2],center=true);}

// Cutout for Ring Hole    
    translate([-Ring_HD,-Ring_C*.5,0])cube([Ring_HD,Ring_C,Ring_L]);

// Trim Bottom of device Flush with Table    
    translate([0,0,-Ring_L])cylinder(d1=Total_W,d2=Total_W,h=Ring_L);

// Trim Top of device Flush    
    translate([0,0,Ring_L])cylinder(d1=Total_W,d2=Total_W,h=Ring_L);
}

/////////////////////////////////////////////////////////////////
//Remix by W. Englert 12/02/2018/////////////////////////////////
//Finger_Pen_Holder_V2.0_OpenSCAD////////////////////////////////
//Maker's Making Change /////////////////////////////////////////
//http://www.makersmakingchange.com//////////////////////////////
//Remix of Finger Pen Holder (Vertical) by makersmakingchange////
//Published on February 28, 2018/////////////////////////////////
//www.thingiverse.com/thing:2802074//////////////////////////////
